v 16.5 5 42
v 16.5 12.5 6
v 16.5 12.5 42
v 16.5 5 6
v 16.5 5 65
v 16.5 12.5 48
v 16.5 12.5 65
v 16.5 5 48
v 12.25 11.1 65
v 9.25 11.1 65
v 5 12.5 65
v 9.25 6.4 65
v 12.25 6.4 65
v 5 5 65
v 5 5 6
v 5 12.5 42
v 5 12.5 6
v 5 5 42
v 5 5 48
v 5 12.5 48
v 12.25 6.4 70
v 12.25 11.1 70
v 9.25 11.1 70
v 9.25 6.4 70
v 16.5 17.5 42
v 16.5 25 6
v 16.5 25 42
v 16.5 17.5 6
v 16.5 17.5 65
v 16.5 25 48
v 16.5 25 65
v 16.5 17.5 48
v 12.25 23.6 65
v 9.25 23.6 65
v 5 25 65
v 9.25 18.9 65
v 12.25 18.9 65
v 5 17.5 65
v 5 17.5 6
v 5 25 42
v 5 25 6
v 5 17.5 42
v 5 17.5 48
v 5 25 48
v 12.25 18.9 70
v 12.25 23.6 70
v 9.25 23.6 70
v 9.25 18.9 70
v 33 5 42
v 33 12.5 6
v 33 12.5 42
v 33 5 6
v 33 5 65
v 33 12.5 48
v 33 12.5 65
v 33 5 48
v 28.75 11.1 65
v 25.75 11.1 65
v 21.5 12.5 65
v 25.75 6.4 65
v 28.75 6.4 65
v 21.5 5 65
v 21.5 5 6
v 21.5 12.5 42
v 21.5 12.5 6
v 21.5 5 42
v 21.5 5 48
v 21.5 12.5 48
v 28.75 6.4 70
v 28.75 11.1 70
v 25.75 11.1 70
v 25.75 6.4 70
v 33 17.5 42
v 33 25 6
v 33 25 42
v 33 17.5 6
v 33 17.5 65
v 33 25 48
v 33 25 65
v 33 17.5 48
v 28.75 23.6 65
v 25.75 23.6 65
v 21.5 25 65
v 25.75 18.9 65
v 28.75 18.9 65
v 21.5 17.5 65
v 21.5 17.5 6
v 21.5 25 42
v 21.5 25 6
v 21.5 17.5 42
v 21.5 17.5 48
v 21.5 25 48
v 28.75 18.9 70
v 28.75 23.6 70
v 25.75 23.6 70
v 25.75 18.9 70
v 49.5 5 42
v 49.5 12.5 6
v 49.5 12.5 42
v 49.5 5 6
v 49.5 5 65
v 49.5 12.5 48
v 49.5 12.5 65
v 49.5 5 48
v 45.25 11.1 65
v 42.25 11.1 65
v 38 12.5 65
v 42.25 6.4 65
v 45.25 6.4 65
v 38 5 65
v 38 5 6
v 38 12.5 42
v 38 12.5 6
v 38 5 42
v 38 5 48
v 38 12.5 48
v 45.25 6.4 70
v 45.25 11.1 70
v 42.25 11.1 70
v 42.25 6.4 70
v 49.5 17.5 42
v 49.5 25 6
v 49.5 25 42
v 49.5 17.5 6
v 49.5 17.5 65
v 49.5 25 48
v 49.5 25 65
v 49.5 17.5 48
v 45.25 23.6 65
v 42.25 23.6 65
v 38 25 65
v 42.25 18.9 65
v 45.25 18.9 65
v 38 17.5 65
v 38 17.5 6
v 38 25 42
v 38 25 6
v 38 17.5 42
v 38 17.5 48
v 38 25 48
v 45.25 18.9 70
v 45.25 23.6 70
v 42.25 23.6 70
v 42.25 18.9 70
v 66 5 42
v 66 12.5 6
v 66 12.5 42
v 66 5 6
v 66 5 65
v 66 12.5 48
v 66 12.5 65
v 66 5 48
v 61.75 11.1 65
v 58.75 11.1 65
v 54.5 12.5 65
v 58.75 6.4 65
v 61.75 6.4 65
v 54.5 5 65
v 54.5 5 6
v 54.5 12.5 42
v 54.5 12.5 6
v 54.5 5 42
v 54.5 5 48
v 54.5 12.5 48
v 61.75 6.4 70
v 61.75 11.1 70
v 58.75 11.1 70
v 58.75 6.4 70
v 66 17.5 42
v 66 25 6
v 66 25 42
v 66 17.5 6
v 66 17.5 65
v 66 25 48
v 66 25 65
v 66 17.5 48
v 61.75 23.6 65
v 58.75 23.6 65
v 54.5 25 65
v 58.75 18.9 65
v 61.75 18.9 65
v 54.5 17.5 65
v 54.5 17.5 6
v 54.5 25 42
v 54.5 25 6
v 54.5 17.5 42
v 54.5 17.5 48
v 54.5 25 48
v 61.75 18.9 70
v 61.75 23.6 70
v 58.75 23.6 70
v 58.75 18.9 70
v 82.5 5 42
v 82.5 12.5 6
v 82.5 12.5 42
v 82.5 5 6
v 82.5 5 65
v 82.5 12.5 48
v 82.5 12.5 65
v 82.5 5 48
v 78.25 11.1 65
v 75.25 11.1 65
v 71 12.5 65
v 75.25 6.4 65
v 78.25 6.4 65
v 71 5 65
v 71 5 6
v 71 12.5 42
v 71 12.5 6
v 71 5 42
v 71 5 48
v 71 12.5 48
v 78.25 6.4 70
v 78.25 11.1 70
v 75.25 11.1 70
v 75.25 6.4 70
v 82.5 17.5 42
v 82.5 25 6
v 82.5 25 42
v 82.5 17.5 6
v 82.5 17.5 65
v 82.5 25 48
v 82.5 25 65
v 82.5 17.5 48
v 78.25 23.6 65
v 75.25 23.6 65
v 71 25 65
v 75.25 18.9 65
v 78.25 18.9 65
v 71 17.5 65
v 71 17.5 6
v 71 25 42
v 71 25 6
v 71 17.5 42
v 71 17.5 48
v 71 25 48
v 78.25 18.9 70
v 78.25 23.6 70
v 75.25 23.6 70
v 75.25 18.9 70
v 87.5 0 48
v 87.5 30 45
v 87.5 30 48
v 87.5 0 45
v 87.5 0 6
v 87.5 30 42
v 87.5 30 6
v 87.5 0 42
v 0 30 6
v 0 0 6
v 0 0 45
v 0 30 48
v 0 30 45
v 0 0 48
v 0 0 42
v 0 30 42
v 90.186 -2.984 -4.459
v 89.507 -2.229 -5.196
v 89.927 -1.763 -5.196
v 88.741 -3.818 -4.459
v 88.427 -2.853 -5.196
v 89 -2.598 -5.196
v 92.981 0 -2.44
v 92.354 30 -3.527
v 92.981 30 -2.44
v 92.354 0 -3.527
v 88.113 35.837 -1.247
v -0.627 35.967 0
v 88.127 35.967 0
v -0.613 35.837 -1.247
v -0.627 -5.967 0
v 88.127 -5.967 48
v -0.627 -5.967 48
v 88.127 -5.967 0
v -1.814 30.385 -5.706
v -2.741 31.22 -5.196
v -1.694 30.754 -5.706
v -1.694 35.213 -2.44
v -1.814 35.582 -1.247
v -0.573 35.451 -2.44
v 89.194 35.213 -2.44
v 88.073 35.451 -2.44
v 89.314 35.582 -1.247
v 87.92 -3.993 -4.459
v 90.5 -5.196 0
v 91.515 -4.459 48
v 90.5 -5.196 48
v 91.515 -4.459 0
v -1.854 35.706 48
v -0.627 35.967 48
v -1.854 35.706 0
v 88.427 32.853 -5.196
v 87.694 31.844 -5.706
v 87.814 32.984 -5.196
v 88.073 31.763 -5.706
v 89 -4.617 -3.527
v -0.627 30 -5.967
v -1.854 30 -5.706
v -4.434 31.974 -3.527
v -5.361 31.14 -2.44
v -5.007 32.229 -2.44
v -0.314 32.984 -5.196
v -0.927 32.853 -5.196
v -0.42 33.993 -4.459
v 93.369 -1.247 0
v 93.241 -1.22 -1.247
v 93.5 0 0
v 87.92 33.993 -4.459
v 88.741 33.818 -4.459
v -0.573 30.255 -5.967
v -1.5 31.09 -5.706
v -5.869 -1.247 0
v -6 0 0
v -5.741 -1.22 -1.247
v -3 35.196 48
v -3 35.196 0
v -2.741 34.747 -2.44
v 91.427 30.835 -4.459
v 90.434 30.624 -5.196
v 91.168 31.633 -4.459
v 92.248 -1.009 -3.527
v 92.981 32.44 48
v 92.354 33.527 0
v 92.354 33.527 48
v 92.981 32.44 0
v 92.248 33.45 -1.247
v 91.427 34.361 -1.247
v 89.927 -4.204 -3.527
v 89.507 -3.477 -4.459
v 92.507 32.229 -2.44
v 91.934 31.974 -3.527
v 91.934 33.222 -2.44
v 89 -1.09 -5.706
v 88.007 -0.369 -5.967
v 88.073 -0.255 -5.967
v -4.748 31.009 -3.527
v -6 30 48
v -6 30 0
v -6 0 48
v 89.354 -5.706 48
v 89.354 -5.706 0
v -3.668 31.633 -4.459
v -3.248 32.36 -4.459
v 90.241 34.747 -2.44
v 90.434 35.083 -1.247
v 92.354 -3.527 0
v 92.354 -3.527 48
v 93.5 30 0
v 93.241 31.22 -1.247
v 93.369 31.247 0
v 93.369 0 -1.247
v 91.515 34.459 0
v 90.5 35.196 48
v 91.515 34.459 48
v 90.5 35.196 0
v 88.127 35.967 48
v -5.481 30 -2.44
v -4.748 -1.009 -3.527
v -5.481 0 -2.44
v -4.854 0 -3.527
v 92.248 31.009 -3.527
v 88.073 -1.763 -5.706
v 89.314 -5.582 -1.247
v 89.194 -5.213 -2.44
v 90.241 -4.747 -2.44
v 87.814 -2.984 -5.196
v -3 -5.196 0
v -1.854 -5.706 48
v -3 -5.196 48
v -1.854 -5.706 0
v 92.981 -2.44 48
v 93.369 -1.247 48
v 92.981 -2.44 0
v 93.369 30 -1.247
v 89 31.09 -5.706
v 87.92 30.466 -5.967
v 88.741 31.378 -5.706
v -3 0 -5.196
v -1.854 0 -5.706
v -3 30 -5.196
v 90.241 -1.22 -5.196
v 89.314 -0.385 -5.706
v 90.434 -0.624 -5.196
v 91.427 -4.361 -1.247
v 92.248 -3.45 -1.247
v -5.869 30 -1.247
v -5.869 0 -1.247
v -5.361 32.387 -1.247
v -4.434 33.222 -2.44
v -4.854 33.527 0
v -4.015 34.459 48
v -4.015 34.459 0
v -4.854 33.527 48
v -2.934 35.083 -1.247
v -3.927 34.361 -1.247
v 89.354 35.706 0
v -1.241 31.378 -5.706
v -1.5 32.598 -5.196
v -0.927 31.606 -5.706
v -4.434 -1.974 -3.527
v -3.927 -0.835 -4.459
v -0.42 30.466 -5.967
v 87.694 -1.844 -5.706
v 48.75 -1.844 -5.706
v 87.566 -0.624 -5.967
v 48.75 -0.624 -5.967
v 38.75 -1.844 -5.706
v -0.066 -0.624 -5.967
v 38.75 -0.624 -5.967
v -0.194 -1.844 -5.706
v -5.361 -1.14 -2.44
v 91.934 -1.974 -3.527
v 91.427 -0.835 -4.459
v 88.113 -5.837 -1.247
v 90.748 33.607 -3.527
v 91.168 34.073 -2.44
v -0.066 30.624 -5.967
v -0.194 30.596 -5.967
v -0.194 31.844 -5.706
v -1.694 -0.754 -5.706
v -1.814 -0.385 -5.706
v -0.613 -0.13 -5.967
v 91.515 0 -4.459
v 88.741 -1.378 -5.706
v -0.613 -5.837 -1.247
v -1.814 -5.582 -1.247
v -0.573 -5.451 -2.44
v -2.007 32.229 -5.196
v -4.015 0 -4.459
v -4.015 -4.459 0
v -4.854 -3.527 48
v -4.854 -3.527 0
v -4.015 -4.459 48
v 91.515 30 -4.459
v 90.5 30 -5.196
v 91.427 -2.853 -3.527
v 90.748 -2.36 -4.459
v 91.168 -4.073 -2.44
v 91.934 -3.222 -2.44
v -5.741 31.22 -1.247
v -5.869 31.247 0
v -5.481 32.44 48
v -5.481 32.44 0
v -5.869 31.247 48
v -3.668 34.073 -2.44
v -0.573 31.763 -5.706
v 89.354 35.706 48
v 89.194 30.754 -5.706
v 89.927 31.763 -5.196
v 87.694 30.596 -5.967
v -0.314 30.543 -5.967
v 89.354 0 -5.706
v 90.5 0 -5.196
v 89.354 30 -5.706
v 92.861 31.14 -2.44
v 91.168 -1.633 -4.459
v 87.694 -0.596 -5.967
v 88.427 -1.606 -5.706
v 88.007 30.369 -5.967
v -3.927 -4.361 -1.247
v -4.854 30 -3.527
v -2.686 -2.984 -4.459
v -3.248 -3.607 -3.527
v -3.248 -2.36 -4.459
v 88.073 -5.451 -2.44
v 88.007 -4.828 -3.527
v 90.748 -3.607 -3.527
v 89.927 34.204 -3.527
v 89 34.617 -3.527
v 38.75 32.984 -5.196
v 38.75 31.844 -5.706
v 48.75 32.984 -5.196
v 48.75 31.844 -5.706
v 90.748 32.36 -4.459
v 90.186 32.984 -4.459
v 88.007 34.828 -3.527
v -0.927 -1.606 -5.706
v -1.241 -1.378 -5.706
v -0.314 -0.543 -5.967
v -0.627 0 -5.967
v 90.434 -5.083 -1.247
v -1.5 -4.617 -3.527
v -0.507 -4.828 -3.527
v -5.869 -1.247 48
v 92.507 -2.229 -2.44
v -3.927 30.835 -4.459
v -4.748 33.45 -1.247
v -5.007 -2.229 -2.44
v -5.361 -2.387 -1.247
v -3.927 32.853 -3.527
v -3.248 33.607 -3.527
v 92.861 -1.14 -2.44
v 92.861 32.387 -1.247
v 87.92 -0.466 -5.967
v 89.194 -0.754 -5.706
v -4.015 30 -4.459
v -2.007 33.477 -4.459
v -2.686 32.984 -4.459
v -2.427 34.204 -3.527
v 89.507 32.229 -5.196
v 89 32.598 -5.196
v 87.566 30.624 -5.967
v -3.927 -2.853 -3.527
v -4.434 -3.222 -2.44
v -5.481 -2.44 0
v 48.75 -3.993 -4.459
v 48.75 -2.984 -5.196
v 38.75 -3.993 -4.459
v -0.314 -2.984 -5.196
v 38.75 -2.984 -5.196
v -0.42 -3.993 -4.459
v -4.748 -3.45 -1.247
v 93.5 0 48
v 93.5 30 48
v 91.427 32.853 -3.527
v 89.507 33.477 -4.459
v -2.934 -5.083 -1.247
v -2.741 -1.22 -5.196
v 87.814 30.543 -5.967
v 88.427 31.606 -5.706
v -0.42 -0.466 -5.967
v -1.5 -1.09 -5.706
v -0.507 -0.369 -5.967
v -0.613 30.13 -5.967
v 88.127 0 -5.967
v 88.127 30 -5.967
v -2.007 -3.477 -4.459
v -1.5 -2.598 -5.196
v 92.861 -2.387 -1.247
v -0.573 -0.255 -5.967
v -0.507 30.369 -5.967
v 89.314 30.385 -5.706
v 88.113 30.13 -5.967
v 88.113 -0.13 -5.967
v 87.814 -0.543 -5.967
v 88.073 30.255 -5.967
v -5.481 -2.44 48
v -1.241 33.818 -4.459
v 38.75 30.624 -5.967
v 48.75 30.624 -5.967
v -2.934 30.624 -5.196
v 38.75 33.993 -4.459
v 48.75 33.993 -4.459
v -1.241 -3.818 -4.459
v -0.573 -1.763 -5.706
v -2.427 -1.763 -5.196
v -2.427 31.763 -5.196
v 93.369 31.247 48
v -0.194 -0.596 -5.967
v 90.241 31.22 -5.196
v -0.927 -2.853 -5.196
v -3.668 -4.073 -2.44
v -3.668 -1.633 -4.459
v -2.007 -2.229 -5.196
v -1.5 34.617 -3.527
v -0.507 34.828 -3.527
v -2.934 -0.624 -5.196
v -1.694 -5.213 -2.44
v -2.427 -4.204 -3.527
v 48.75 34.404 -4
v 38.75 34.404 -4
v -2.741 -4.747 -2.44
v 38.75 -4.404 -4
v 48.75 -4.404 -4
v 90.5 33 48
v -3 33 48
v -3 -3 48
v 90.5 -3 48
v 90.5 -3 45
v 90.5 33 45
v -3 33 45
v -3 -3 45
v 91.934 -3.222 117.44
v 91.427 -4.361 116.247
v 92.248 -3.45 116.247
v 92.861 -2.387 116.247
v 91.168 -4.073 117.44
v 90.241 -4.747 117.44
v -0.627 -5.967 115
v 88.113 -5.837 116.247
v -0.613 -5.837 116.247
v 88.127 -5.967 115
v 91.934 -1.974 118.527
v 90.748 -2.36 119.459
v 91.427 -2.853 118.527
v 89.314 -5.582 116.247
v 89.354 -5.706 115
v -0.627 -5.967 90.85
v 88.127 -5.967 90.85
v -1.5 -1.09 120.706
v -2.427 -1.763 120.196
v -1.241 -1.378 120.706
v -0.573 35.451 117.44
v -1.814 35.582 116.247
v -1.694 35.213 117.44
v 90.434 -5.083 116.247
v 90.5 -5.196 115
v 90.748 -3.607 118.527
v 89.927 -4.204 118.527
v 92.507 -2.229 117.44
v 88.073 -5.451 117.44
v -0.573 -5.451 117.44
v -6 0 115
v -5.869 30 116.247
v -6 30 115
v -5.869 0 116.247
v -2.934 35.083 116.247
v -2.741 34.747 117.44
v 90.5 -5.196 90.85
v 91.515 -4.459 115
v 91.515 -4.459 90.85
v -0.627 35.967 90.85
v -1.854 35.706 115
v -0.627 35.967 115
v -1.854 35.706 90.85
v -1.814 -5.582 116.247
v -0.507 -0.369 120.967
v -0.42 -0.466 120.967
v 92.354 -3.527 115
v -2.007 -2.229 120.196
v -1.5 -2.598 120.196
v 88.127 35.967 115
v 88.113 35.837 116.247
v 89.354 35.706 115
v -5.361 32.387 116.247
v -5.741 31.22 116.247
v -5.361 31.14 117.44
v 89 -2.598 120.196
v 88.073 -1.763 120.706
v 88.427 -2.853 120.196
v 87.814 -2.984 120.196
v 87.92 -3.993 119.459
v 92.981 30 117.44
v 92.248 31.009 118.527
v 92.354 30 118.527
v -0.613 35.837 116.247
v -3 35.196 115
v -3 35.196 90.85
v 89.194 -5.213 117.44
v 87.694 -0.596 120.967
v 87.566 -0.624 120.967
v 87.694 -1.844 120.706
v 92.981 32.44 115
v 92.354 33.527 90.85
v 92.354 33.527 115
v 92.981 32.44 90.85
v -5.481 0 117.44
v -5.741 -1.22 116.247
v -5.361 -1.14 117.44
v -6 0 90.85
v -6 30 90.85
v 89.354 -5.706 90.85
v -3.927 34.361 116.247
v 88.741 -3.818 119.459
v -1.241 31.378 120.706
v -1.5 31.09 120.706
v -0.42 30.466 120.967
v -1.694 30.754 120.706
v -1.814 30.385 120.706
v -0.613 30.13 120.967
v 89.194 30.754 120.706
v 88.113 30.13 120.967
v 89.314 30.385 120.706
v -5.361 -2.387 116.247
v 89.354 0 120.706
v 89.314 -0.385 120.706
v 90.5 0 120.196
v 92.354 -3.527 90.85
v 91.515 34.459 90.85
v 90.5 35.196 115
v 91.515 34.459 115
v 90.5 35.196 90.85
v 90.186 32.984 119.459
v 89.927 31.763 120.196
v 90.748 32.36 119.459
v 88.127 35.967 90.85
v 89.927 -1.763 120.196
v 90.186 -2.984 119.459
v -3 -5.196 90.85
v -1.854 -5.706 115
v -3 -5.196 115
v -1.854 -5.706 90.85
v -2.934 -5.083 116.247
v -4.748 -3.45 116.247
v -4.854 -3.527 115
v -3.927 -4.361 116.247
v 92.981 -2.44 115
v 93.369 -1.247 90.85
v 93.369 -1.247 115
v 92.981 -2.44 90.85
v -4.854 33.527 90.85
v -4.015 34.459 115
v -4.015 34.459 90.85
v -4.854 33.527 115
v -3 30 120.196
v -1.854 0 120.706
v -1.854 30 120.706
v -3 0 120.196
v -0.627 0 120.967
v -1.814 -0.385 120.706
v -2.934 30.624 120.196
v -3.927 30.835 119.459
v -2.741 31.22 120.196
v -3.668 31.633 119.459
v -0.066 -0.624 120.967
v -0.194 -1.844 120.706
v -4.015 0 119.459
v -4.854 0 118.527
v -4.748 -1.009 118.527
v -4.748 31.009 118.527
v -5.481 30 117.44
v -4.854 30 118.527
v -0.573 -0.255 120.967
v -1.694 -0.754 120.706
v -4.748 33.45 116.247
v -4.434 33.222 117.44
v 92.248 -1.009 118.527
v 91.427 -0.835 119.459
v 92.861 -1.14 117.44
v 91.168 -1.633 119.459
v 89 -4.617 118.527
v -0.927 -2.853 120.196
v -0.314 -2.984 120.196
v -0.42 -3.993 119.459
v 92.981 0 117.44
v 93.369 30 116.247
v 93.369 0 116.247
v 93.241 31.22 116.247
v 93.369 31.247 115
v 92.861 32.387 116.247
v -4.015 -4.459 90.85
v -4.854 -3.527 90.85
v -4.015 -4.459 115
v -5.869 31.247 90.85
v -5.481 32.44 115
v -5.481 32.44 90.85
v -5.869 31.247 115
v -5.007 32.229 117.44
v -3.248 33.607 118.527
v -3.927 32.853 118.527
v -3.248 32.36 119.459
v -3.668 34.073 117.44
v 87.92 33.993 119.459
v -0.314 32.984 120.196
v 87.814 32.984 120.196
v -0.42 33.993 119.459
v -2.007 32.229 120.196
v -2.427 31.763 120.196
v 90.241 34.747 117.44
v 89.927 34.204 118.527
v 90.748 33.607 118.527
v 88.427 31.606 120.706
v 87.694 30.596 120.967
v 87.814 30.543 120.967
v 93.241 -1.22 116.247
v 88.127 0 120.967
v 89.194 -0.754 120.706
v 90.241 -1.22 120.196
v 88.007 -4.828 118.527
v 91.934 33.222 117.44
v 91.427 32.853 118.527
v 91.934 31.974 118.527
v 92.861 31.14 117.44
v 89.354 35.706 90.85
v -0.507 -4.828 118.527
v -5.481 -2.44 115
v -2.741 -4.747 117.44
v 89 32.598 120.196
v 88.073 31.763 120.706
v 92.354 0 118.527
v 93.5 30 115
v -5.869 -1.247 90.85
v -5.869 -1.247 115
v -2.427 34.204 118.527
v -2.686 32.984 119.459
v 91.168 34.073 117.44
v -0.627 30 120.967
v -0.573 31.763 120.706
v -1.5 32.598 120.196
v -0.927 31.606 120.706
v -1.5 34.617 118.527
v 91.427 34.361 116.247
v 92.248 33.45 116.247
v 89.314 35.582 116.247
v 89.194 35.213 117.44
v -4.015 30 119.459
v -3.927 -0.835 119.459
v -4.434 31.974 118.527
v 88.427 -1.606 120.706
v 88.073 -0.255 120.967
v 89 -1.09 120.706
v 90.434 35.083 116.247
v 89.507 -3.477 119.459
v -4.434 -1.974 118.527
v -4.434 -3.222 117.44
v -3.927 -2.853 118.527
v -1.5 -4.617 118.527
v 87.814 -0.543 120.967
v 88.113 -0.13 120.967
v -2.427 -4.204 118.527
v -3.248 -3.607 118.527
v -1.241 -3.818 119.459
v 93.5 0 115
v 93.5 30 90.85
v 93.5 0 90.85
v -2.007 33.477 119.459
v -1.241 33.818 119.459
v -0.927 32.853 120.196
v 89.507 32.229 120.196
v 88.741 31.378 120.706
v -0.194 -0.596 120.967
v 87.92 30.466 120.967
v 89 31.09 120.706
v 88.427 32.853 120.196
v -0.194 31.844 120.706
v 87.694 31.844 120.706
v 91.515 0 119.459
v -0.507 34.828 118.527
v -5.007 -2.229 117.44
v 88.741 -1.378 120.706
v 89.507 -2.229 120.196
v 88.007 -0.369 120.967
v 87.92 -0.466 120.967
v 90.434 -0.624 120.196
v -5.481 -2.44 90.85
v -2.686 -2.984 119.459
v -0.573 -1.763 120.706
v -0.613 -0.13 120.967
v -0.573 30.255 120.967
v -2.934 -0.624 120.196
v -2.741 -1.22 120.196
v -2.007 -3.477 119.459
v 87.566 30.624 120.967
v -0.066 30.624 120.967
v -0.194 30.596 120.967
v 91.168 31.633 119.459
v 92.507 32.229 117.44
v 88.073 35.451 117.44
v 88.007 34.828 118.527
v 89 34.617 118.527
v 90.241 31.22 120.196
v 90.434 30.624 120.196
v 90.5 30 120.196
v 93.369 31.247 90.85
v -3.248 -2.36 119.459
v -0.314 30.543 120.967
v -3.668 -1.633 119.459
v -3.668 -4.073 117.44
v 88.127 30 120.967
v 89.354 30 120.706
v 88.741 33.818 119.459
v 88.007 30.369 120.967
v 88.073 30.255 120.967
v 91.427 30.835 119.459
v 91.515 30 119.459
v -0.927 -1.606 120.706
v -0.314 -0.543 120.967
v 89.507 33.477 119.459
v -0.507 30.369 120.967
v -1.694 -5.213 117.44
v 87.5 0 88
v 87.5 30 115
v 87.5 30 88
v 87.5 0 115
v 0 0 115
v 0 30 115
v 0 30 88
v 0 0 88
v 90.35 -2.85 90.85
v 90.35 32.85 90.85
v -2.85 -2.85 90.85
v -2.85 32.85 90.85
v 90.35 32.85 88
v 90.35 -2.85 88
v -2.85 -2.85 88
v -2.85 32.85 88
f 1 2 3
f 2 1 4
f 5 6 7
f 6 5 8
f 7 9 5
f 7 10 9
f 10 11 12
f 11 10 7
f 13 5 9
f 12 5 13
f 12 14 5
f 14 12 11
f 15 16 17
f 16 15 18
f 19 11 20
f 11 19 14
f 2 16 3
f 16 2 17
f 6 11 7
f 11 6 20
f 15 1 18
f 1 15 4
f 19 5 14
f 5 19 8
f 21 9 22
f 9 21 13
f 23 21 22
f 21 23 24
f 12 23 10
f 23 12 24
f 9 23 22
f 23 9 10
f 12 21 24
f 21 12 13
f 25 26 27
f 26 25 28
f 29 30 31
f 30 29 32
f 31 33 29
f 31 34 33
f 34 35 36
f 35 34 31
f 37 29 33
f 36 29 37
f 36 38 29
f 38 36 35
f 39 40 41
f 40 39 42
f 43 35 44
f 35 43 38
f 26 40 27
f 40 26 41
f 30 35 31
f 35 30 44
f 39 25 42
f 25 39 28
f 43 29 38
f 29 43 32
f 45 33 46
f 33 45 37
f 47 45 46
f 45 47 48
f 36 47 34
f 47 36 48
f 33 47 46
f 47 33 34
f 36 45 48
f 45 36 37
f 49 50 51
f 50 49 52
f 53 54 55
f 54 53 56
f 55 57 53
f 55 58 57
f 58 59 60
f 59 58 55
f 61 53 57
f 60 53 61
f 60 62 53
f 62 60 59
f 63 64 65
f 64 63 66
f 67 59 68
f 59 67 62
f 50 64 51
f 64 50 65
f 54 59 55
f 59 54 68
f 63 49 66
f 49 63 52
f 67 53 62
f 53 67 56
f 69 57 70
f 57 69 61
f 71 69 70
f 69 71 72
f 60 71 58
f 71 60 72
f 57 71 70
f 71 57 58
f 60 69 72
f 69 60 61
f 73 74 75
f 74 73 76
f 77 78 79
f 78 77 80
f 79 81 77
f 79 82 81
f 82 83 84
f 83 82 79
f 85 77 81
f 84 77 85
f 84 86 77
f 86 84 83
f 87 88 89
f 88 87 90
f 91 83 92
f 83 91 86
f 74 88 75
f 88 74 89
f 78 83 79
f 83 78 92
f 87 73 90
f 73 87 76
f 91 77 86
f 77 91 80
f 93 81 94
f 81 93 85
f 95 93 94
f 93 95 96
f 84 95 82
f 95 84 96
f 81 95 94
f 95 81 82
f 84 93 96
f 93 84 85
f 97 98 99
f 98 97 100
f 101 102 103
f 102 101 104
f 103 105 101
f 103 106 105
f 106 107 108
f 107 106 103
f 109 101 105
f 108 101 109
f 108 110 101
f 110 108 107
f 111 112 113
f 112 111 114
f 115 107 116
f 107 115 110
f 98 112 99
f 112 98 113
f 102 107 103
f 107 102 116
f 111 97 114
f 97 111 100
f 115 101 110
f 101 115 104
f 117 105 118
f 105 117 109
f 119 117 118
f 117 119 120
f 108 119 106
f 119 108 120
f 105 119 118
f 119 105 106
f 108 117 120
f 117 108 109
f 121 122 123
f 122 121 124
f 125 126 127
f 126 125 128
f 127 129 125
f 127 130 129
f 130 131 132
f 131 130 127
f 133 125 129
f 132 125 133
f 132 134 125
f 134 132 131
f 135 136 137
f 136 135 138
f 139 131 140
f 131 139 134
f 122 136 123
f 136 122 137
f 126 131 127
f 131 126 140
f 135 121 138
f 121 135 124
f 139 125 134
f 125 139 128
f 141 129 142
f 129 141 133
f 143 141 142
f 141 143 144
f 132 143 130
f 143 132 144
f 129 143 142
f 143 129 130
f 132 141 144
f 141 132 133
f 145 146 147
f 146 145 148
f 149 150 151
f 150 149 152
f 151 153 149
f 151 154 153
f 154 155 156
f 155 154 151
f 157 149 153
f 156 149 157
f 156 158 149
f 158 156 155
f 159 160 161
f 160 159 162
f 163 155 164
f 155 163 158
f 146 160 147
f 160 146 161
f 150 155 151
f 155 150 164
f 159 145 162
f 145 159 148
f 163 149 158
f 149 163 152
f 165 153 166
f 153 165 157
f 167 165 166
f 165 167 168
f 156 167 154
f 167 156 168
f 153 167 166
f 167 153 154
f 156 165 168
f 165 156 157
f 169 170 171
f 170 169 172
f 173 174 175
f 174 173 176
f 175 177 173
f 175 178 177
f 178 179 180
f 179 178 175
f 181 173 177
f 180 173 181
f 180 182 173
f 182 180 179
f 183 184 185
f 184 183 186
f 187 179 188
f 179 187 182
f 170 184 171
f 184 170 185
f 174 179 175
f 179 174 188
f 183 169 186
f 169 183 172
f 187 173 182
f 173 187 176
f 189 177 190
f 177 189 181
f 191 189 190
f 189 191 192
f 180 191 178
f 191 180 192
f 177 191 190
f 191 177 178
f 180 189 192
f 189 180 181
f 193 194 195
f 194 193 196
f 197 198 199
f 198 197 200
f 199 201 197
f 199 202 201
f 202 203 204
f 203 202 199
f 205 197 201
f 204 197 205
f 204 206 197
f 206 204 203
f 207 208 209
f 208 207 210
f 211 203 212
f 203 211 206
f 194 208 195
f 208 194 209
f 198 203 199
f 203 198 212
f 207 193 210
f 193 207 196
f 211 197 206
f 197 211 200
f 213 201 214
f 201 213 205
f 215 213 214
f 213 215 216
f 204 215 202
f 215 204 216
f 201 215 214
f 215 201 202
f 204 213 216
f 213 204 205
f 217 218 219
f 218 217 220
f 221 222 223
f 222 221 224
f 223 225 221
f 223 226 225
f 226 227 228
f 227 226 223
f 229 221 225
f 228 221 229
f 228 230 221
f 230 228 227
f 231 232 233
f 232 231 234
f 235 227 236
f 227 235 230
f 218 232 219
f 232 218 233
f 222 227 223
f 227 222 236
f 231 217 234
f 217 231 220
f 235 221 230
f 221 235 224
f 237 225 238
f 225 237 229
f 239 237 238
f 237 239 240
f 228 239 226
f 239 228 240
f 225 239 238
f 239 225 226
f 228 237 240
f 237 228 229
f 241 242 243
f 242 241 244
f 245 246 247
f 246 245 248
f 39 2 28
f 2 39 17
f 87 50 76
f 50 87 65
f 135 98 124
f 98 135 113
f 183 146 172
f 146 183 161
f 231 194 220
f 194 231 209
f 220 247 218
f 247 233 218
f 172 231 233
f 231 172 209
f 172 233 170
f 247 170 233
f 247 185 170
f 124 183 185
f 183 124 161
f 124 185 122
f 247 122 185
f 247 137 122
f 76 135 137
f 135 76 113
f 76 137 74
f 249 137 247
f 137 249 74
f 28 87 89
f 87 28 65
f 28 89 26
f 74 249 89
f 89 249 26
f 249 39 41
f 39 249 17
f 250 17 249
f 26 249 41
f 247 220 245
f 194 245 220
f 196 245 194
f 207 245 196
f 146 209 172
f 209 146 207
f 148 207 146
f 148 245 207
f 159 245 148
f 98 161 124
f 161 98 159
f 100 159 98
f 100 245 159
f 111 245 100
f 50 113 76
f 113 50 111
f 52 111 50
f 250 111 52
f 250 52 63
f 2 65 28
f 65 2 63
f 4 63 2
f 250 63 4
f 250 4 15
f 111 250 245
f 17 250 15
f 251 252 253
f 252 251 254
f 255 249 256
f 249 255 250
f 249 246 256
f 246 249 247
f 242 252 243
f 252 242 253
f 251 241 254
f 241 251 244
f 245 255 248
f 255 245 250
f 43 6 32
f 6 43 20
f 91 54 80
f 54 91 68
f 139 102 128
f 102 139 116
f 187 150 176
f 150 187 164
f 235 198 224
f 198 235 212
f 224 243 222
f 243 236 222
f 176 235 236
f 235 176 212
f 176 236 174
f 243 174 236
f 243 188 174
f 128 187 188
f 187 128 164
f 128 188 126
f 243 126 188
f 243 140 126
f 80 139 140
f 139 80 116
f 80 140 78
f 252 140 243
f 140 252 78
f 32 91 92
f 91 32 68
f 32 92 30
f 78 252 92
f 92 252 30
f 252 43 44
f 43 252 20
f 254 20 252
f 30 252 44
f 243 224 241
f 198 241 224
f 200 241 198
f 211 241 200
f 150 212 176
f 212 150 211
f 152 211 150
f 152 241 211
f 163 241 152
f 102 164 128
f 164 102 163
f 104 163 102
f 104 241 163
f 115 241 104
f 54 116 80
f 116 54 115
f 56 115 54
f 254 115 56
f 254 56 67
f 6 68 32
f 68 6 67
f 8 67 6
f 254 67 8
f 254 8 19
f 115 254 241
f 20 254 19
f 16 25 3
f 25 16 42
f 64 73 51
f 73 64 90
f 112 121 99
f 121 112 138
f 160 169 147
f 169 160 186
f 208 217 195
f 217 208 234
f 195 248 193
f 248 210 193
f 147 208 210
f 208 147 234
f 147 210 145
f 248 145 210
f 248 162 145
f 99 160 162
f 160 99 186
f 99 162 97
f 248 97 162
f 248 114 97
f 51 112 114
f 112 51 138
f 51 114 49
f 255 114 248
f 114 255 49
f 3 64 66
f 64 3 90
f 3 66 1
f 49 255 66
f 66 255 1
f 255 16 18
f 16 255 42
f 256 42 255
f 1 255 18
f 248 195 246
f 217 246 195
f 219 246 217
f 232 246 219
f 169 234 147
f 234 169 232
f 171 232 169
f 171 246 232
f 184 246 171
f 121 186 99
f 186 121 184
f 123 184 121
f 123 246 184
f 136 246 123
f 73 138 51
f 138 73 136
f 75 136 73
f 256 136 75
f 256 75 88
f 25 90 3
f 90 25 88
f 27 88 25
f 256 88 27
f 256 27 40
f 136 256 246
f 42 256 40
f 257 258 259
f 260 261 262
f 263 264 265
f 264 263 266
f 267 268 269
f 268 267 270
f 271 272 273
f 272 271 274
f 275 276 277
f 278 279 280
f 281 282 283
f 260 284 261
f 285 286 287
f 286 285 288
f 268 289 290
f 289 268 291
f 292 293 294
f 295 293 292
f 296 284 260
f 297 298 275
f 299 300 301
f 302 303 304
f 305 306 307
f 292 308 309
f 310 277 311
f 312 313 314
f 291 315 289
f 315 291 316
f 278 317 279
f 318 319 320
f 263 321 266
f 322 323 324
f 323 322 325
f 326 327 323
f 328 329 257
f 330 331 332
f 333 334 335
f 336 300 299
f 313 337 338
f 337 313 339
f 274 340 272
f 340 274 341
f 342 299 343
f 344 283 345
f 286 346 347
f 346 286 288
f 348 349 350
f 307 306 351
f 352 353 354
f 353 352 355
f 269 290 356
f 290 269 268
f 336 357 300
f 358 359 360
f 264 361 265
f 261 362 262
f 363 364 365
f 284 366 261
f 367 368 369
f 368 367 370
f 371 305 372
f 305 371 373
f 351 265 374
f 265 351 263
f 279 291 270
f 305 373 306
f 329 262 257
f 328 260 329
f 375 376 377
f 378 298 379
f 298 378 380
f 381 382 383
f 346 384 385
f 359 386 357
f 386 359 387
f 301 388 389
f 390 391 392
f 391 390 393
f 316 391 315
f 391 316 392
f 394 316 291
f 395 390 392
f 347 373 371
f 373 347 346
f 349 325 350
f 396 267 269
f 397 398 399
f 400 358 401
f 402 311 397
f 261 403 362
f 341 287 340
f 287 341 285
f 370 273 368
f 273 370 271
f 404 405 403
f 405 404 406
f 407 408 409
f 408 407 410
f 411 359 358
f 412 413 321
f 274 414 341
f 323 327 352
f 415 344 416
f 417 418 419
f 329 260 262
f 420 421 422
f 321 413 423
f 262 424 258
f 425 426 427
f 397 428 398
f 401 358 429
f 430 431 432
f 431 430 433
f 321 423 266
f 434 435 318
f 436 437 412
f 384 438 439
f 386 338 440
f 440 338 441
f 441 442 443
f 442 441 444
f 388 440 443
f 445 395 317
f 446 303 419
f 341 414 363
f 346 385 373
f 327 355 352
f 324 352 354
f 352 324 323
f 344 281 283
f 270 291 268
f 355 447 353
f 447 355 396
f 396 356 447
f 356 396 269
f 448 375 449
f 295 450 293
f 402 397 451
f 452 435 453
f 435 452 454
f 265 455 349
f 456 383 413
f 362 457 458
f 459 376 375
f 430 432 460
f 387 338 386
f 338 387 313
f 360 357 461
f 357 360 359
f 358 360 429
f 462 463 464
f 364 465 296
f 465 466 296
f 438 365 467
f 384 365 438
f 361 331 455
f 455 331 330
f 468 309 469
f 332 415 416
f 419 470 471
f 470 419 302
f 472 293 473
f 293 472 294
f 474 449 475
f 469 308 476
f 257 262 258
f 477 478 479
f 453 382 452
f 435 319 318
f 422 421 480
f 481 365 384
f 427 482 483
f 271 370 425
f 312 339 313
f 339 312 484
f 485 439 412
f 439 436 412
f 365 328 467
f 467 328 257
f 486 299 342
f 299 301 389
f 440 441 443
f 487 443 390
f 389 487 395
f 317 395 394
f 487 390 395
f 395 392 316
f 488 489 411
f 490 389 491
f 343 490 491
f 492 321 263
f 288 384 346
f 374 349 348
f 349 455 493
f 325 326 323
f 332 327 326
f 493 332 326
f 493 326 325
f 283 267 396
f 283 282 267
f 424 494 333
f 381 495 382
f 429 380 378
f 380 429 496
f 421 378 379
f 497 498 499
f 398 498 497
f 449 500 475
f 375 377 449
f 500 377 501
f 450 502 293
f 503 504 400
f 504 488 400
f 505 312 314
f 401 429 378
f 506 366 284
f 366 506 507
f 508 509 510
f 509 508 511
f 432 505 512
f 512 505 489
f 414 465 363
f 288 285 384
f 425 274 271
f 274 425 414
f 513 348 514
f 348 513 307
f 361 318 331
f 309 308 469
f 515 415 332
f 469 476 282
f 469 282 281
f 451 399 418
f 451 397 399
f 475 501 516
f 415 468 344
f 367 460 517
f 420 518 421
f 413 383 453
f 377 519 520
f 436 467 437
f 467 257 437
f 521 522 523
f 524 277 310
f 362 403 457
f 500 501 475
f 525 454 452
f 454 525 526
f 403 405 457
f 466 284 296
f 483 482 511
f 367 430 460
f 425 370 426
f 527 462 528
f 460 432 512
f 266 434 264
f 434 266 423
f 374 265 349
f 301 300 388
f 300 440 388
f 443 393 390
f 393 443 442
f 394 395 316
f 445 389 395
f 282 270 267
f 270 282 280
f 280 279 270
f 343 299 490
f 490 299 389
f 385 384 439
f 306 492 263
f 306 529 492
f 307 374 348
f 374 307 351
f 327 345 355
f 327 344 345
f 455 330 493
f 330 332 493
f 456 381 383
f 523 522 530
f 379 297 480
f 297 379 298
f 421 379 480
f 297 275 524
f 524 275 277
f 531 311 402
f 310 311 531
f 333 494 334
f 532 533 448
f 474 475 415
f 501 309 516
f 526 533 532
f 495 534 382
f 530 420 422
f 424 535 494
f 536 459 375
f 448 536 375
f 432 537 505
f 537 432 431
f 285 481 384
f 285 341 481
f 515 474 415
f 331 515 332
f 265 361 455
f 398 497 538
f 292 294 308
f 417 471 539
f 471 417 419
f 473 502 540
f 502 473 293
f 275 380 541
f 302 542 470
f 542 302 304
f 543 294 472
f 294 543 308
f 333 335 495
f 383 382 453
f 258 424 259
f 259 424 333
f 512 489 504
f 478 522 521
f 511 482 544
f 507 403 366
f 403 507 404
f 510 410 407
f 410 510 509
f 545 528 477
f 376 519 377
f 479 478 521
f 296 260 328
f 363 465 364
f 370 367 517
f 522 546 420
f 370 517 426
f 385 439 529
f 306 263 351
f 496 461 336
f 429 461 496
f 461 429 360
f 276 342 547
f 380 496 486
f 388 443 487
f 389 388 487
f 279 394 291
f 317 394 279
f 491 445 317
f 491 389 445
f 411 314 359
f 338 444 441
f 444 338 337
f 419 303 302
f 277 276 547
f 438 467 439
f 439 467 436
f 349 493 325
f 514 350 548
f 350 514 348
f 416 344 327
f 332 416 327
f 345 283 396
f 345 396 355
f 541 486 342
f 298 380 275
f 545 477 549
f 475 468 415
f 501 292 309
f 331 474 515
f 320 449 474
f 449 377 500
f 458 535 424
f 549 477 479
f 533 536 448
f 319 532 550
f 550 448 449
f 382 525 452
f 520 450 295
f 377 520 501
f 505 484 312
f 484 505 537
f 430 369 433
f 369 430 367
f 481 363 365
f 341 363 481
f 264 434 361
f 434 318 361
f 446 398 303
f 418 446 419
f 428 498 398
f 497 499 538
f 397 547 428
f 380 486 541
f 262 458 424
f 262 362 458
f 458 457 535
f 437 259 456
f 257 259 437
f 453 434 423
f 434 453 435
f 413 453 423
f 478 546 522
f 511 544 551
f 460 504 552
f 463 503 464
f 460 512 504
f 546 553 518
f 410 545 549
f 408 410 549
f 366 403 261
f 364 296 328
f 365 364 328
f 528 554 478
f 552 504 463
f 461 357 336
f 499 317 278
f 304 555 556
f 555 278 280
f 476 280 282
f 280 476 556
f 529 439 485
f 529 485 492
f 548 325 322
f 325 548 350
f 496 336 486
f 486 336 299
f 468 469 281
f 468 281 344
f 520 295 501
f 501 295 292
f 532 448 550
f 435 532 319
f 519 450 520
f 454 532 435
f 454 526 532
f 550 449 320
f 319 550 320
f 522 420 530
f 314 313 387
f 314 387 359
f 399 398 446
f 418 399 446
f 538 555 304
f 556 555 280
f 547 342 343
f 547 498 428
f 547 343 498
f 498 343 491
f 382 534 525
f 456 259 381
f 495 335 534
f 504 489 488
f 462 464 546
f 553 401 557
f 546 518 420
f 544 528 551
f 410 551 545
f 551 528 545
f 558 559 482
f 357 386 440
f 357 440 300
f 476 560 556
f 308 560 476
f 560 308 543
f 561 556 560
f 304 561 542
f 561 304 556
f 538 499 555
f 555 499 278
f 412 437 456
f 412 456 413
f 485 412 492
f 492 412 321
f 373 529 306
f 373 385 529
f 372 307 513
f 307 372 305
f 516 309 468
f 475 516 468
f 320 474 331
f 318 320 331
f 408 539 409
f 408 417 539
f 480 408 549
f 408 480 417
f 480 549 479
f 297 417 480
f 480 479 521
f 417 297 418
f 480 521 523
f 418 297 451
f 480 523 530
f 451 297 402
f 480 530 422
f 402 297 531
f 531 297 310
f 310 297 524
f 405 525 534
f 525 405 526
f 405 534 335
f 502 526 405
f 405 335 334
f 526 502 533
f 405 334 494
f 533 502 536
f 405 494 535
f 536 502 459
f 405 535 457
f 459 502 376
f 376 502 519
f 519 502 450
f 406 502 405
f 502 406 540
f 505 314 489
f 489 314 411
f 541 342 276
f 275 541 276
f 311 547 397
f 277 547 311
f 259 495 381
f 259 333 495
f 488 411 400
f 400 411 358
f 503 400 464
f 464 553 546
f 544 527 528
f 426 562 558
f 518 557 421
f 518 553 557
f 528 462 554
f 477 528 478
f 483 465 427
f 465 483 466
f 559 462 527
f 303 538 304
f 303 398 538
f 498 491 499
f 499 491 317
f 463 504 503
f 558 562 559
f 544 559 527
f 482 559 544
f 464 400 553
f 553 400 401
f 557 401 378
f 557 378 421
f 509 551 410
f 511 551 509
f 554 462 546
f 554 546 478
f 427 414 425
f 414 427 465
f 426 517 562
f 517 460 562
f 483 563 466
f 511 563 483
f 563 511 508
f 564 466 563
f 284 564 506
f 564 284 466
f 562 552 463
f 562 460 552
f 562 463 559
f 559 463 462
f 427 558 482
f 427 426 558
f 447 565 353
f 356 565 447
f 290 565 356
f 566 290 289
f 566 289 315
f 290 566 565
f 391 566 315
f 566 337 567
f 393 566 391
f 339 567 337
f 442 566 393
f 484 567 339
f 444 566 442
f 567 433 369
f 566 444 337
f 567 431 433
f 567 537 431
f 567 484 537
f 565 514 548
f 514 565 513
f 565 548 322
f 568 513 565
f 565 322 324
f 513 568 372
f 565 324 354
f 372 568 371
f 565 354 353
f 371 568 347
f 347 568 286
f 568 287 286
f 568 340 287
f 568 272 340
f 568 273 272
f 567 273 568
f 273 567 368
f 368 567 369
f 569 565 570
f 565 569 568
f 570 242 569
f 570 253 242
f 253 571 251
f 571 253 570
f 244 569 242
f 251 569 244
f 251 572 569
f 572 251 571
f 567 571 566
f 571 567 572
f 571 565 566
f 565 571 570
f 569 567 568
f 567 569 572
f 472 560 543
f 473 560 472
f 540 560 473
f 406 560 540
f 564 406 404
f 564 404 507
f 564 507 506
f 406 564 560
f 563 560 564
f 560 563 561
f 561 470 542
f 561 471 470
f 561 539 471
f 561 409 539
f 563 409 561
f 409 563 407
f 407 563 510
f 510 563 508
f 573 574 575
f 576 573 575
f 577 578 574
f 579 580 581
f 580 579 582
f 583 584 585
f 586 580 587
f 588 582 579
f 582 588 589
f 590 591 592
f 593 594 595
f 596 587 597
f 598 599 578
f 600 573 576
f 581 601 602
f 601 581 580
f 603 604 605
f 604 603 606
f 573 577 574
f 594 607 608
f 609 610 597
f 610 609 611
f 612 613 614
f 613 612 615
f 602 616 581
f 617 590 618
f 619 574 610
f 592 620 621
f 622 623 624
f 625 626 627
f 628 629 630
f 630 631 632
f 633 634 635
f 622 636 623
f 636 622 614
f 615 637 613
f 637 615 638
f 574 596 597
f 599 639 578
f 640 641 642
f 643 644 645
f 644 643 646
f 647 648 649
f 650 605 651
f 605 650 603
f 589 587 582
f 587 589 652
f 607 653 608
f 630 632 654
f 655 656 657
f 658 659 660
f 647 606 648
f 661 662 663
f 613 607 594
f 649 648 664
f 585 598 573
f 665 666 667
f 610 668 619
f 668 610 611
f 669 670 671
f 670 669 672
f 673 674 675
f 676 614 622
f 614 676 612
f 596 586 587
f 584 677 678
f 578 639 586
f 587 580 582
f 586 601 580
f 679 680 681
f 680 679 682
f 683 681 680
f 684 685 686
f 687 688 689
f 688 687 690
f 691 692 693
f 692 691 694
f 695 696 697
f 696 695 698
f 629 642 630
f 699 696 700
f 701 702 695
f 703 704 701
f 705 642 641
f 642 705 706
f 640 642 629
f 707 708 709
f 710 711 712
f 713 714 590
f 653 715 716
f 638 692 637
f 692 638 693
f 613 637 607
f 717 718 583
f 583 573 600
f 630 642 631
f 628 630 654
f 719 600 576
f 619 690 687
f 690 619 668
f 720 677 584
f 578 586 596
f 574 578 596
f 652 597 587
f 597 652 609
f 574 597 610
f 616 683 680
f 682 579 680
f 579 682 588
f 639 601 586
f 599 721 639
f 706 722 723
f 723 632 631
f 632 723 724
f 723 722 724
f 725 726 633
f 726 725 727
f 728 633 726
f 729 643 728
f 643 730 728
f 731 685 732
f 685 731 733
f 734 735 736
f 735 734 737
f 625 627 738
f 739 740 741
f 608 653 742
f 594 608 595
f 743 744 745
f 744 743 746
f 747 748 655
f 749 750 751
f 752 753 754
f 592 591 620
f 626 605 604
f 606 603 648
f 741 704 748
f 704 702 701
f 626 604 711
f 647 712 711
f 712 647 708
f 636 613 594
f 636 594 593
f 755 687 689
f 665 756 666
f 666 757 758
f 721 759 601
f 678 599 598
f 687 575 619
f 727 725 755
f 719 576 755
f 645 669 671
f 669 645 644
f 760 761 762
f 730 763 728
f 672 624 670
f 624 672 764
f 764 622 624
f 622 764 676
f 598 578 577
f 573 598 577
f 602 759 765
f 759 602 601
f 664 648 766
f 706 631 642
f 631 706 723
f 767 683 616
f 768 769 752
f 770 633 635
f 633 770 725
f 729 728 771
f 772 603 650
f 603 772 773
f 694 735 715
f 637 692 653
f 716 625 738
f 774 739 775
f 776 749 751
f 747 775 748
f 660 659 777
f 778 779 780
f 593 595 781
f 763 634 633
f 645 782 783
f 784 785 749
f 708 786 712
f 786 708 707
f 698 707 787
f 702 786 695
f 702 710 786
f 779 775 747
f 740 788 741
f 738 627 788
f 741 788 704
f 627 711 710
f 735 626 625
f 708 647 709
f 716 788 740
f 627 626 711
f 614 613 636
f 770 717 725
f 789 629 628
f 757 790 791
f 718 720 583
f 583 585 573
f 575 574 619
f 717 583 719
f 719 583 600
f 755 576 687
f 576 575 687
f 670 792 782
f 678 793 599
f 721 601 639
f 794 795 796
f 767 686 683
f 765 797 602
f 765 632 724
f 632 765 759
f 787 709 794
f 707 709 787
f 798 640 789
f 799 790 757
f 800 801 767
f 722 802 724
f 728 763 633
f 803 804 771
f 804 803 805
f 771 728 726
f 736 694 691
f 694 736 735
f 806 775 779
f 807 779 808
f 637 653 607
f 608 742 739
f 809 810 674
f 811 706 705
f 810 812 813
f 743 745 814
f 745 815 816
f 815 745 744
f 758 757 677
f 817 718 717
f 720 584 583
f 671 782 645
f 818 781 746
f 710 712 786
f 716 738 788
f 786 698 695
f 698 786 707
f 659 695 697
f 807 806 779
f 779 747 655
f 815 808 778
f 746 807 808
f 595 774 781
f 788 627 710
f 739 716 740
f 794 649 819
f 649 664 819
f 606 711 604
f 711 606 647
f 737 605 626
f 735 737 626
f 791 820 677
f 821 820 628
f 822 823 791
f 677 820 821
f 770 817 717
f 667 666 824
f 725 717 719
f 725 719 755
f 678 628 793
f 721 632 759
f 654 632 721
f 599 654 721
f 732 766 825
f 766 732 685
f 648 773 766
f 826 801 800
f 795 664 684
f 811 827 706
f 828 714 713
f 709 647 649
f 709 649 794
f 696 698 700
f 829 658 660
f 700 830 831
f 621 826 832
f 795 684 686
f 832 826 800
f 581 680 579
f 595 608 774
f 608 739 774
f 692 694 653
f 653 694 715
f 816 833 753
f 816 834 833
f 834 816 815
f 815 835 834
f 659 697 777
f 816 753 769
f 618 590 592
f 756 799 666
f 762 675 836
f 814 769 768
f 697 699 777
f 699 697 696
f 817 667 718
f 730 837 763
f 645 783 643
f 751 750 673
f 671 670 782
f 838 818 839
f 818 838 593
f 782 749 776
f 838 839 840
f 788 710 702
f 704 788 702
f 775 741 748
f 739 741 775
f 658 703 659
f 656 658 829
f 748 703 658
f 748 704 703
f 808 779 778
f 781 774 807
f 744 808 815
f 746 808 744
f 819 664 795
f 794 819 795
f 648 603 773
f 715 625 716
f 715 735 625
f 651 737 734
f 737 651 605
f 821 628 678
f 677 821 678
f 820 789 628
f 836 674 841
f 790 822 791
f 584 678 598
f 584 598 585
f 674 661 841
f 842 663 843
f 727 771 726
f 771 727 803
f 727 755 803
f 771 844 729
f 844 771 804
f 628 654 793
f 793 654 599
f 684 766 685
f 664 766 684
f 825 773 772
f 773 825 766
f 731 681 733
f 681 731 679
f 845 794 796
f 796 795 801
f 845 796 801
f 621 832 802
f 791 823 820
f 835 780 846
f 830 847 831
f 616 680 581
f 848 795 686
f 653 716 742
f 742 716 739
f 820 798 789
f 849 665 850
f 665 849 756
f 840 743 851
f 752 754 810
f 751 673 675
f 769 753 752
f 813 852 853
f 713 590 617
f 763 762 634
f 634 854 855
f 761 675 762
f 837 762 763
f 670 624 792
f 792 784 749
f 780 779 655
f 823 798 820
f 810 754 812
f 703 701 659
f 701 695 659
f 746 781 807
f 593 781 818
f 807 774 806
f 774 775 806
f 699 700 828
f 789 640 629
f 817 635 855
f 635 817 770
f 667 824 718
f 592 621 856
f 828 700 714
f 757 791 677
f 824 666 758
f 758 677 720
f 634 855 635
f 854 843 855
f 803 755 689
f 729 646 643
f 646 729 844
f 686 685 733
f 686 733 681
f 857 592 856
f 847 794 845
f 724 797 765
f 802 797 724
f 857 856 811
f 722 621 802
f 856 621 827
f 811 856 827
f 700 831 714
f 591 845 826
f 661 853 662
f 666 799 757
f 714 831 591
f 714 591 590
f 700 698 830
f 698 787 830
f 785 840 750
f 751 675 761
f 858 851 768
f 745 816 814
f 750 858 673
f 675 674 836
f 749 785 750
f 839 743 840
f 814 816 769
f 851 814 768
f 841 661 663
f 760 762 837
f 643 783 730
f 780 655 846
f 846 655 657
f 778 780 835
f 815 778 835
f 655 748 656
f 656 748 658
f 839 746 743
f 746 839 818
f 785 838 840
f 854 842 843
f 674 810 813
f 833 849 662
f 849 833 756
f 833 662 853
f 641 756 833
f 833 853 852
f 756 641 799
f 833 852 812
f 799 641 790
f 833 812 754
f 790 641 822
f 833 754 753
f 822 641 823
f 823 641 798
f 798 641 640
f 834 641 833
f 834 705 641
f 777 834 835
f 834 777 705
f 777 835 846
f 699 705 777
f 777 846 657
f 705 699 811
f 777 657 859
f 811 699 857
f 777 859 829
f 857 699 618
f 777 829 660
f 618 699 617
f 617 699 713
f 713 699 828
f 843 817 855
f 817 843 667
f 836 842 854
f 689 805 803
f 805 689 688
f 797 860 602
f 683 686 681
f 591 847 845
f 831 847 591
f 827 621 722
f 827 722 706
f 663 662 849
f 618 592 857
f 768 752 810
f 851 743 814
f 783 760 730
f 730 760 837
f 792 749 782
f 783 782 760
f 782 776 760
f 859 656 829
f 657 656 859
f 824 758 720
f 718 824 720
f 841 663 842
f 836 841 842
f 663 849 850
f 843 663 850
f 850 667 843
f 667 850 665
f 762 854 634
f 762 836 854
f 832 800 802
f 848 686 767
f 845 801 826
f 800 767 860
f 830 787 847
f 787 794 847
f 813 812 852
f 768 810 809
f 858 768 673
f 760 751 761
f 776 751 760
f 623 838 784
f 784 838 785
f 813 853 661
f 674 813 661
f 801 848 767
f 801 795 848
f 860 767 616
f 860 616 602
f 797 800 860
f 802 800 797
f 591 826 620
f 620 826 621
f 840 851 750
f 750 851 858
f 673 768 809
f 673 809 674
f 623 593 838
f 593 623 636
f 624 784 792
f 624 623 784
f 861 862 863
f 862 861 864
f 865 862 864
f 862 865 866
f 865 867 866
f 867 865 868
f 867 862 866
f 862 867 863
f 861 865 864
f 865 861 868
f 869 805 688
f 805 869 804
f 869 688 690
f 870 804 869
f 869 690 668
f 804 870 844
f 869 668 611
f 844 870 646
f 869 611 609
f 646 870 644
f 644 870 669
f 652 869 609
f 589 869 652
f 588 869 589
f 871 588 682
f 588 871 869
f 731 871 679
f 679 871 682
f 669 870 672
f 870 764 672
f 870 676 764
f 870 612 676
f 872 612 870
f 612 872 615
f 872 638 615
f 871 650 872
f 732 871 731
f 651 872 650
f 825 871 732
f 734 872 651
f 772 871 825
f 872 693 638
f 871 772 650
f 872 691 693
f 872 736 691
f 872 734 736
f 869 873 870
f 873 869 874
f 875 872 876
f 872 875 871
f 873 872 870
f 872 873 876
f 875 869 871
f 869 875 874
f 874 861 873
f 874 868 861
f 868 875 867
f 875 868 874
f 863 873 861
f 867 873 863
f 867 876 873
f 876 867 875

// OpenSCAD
translate ([5.0, 5.0, 0]) {
  translate ([5.75, 3.75, 65/2]) {
    union () {
      cube ([11.5, 7.5, 65], center=true);
      translate ([0, 0, 35]) {
        cube ([3, 4.7, 5], center=true);
      }
    }
  }
}
translate ([5.0, 17.5, 0]) {
  translate ([5.75, 3.75, 65/2]) {
    union () {
      cube ([11.5, 7.5, 65], center=true);
      translate ([0, 0, 35]) {
        cube ([3, 4.7, 5], center=true);
      }
    }
  }
}
translate ([21.5, 5.0, 0]) {
  translate ([5.75, 3.75, 65/2]) {
    union () {
      cube ([11.5, 7.5, 65], center=true);
      translate ([0, 0, 35]) {
        cube ([3, 4.7, 5], center=true);
      }
    }
  }
}
translate ([21.5, 17.5, 0]) {
  translate ([5.75, 3.75, 65/2]) {
    union () {
      cube ([11.5, 7.5, 65], center=true);
      translate ([0, 0, 35]) {
        cube ([3, 4.7, 5], center=true);
      }
    }
  }
}
translate ([38.0, 5.0, 0]) {
  translate ([5.75, 3.75, 65/2]) {
    union () {
      cube ([11.5, 7.5, 65], center=true);
      translate ([0, 0, 35]) {
        cube ([3, 4.7, 5], center=true);
      }
    }
  }
}
translate ([38.0, 17.5, 0]) {
  translate ([5.75, 3.75, 65/2]) {
    union () {
      cube ([11.5, 7.5, 65], center=true);
      translate ([0, 0, 35]) {
        cube ([3, 4.7, 5], center=true);
      }
    }
  }
}
translate ([54.5, 5.0, 0]) {
  translate ([5.75, 3.75, 65/2]) {
    union () {
      cube ([11.5, 7.5, 65], center=true);
      translate ([0, 0, 35]) {
        cube ([3, 4.7, 5], center=true);
      }
    }
  }
}
translate ([54.5, 17.5, 0]) {
  translate ([5.75, 3.75, 65/2]) {
    union () {
      cube ([11.5, 7.5, 65], center=true);
      translate ([0, 0, 35]) {
        cube ([3, 4.7, 5], center=true);
      }
    }
  }
}
translate ([71.0, 5.0, 0]) {
  translate ([5.75, 3.75, 65/2]) {
    union () {
      cube ([11.5, 7.5, 65], center=true);
      translate ([0, 0, 35]) {
        cube ([3, 4.7, 5], center=true);
      }
    }
  }
}
translate ([71.0, 17.5, 0]) {
  translate ([5.75, 3.75, 65/2]) {
    union () {
      cube ([11.5, 7.5, 65], center=true);
      translate ([0, 0, 35]) {
        cube ([3, 4.7, 5], center=true);
      }
    }
  }
}
color ([0, 0, 1, ]) {
  difference () {
    translate ([43.75, 15.0, 3]) {
      cube ([87.5, 30.0, 6], center=true);
    }
    translate ([5.0, 5.0, 0]) {
      translate ([5.75, 3.75, 0]) {
        cube ([11.5, 7.5, 1000], center=true);
      }
    }
    translate ([5.0, 17.5, 0]) {
      translate ([5.75, 3.75, 0]) {
        cube ([11.5, 7.5, 1000], center=true);
      }
    }
    translate ([21.5, 5.0, 0]) {
      translate ([5.75, 3.75, 0]) {
        cube ([11.5, 7.5, 1000], center=true);
      }
    }
    translate ([21.5, 17.5, 0]) {
      translate ([5.75, 3.75, 0]) {
        cube ([11.5, 7.5, 1000], center=true);
      }
    }
    translate ([38.0, 5.0, 0]) {
      translate ([5.75, 3.75, 0]) {
        cube ([11.5, 7.5, 1000], center=true);
      }
    }
    translate ([38.0, 17.5, 0]) {
      translate ([5.75, 3.75, 0]) {
        cube ([11.5, 7.5, 1000], center=true);
      }
    }
    translate ([54.5, 5.0, 0]) {
      translate ([5.75, 3.75, 0]) {
        cube ([11.5, 7.5, 1000], center=true);
      }
    }
    translate ([54.5, 17.5, 0]) {
      translate ([5.75, 3.75, 0]) {
        cube ([11.5, 7.5, 1000], center=true);
      }
    }
    translate ([71.0, 5.0, 0]) {
      translate ([5.75, 3.75, 0]) {
        cube ([11.5, 7.5, 1000], center=true);
      }
    }
    translate ([71.0, 17.5, 0]) {
      translate ([5.75, 3.75, 0]) {
        cube ([11.5, 7.5, 1000], center=true);
      }
    }
  }
}
color ([0, 0, 1, ]) {
  translate ([0, 0, 42]) {
    difference () {
      translate ([43.75, 15.0, 3]) {
        cube ([87.5, 30.0, 6], center=true);
      }
      translate ([5.0, 5.0, 0]) {
        translate ([5.75, 3.75, 0]) {
          cube ([11.5, 7.5, 1000], center=true);
        }
      }
      translate ([5.0, 17.5, 0]) {
        translate ([5.75, 3.75, 0]) {
          cube ([11.5, 7.5, 1000], center=true);
        }
      }
      translate ([21.5, 5.0, 0]) {
        translate ([5.75, 3.75, 0]) {
          cube ([11.5, 7.5, 1000], center=true);
        }
      }
      translate ([21.5, 17.5, 0]) {
        translate ([5.75, 3.75, 0]) {
          cube ([11.5, 7.5, 1000], center=true);
        }
      }
      translate ([38.0, 5.0, 0]) {
        translate ([5.75, 3.75, 0]) {
          cube ([11.5, 7.5, 1000], center=true);
        }
      }
      translate ([38.0, 17.5, 0]) {
        translate ([5.75, 3.75, 0]) {
          cube ([11.5, 7.5, 1000], center=true);
        }
      }
      translate ([54.5, 5.0, 0]) {
        translate ([5.75, 3.75, 0]) {
          cube ([11.5, 7.5, 1000], center=true);
        }
      }
      translate ([54.5, 17.5, 0]) {
        translate ([5.75, 3.75, 0]) {
          cube ([11.5, 7.5, 1000], center=true);
        }
      }
      translate ([71.0, 5.0, 0]) {
        translate ([5.75, 3.75, 0]) {
          cube ([11.5, 7.5, 1000], center=true);
        }
      }
      translate ([71.0, 17.5, 0]) {
        translate ([5.75, 3.75, 0]) {
          cube ([11.5, 7.5, 1000], center=true);
        }
      }
    }
  }
}
color ([1, 0, 0, ]) {
  difference () {
    translate ([43.75, 15.0, 75/2]) {
      difference () {
        minkowski () {
          cube ([87.5, 30.0, 75], center=true);
          sphere ($fn=30, r=6);
        }
        cube ([87.5, 30.0, 75], center=true);
      }
    }
    union () {
      translate ([0, 0, 148]) {
        cube ([200, 200, 200], center=true);
      }
      translate ([43.75, 15.0, 148]) {
        cube ([93.5, 36.0, 206], center=true);
      }
    }
    translate ([43.75, 0, -5]) {
      cube ([10, 1000, 2], center=true);
    }
  }
}
color ([1, 0, 0, ]) {
  translate ([0, 0, 40]) {
    difference () {
      translate ([43.75, 15.0, 75/2]) {
        difference () {
          minkowski () {
            cube ([87.5, 30.0, 75], center=true);
            sphere ($fn=30, r=6);
          }
          cube ([87.5, 30.0, 75], center=true);
        }
      }
      translate ([0, 0, -52]) {
        cube ([200, 200, 200], center=true);
      }
      translate ([43.74999999999999, 15.000000000000002, -49.15]) {
        difference () {
          cube ([300, 300, 200], center=true);
          cube ([93.19999999999999, 35.7, 300], center=true);
        }
      }
    }
  }
}
